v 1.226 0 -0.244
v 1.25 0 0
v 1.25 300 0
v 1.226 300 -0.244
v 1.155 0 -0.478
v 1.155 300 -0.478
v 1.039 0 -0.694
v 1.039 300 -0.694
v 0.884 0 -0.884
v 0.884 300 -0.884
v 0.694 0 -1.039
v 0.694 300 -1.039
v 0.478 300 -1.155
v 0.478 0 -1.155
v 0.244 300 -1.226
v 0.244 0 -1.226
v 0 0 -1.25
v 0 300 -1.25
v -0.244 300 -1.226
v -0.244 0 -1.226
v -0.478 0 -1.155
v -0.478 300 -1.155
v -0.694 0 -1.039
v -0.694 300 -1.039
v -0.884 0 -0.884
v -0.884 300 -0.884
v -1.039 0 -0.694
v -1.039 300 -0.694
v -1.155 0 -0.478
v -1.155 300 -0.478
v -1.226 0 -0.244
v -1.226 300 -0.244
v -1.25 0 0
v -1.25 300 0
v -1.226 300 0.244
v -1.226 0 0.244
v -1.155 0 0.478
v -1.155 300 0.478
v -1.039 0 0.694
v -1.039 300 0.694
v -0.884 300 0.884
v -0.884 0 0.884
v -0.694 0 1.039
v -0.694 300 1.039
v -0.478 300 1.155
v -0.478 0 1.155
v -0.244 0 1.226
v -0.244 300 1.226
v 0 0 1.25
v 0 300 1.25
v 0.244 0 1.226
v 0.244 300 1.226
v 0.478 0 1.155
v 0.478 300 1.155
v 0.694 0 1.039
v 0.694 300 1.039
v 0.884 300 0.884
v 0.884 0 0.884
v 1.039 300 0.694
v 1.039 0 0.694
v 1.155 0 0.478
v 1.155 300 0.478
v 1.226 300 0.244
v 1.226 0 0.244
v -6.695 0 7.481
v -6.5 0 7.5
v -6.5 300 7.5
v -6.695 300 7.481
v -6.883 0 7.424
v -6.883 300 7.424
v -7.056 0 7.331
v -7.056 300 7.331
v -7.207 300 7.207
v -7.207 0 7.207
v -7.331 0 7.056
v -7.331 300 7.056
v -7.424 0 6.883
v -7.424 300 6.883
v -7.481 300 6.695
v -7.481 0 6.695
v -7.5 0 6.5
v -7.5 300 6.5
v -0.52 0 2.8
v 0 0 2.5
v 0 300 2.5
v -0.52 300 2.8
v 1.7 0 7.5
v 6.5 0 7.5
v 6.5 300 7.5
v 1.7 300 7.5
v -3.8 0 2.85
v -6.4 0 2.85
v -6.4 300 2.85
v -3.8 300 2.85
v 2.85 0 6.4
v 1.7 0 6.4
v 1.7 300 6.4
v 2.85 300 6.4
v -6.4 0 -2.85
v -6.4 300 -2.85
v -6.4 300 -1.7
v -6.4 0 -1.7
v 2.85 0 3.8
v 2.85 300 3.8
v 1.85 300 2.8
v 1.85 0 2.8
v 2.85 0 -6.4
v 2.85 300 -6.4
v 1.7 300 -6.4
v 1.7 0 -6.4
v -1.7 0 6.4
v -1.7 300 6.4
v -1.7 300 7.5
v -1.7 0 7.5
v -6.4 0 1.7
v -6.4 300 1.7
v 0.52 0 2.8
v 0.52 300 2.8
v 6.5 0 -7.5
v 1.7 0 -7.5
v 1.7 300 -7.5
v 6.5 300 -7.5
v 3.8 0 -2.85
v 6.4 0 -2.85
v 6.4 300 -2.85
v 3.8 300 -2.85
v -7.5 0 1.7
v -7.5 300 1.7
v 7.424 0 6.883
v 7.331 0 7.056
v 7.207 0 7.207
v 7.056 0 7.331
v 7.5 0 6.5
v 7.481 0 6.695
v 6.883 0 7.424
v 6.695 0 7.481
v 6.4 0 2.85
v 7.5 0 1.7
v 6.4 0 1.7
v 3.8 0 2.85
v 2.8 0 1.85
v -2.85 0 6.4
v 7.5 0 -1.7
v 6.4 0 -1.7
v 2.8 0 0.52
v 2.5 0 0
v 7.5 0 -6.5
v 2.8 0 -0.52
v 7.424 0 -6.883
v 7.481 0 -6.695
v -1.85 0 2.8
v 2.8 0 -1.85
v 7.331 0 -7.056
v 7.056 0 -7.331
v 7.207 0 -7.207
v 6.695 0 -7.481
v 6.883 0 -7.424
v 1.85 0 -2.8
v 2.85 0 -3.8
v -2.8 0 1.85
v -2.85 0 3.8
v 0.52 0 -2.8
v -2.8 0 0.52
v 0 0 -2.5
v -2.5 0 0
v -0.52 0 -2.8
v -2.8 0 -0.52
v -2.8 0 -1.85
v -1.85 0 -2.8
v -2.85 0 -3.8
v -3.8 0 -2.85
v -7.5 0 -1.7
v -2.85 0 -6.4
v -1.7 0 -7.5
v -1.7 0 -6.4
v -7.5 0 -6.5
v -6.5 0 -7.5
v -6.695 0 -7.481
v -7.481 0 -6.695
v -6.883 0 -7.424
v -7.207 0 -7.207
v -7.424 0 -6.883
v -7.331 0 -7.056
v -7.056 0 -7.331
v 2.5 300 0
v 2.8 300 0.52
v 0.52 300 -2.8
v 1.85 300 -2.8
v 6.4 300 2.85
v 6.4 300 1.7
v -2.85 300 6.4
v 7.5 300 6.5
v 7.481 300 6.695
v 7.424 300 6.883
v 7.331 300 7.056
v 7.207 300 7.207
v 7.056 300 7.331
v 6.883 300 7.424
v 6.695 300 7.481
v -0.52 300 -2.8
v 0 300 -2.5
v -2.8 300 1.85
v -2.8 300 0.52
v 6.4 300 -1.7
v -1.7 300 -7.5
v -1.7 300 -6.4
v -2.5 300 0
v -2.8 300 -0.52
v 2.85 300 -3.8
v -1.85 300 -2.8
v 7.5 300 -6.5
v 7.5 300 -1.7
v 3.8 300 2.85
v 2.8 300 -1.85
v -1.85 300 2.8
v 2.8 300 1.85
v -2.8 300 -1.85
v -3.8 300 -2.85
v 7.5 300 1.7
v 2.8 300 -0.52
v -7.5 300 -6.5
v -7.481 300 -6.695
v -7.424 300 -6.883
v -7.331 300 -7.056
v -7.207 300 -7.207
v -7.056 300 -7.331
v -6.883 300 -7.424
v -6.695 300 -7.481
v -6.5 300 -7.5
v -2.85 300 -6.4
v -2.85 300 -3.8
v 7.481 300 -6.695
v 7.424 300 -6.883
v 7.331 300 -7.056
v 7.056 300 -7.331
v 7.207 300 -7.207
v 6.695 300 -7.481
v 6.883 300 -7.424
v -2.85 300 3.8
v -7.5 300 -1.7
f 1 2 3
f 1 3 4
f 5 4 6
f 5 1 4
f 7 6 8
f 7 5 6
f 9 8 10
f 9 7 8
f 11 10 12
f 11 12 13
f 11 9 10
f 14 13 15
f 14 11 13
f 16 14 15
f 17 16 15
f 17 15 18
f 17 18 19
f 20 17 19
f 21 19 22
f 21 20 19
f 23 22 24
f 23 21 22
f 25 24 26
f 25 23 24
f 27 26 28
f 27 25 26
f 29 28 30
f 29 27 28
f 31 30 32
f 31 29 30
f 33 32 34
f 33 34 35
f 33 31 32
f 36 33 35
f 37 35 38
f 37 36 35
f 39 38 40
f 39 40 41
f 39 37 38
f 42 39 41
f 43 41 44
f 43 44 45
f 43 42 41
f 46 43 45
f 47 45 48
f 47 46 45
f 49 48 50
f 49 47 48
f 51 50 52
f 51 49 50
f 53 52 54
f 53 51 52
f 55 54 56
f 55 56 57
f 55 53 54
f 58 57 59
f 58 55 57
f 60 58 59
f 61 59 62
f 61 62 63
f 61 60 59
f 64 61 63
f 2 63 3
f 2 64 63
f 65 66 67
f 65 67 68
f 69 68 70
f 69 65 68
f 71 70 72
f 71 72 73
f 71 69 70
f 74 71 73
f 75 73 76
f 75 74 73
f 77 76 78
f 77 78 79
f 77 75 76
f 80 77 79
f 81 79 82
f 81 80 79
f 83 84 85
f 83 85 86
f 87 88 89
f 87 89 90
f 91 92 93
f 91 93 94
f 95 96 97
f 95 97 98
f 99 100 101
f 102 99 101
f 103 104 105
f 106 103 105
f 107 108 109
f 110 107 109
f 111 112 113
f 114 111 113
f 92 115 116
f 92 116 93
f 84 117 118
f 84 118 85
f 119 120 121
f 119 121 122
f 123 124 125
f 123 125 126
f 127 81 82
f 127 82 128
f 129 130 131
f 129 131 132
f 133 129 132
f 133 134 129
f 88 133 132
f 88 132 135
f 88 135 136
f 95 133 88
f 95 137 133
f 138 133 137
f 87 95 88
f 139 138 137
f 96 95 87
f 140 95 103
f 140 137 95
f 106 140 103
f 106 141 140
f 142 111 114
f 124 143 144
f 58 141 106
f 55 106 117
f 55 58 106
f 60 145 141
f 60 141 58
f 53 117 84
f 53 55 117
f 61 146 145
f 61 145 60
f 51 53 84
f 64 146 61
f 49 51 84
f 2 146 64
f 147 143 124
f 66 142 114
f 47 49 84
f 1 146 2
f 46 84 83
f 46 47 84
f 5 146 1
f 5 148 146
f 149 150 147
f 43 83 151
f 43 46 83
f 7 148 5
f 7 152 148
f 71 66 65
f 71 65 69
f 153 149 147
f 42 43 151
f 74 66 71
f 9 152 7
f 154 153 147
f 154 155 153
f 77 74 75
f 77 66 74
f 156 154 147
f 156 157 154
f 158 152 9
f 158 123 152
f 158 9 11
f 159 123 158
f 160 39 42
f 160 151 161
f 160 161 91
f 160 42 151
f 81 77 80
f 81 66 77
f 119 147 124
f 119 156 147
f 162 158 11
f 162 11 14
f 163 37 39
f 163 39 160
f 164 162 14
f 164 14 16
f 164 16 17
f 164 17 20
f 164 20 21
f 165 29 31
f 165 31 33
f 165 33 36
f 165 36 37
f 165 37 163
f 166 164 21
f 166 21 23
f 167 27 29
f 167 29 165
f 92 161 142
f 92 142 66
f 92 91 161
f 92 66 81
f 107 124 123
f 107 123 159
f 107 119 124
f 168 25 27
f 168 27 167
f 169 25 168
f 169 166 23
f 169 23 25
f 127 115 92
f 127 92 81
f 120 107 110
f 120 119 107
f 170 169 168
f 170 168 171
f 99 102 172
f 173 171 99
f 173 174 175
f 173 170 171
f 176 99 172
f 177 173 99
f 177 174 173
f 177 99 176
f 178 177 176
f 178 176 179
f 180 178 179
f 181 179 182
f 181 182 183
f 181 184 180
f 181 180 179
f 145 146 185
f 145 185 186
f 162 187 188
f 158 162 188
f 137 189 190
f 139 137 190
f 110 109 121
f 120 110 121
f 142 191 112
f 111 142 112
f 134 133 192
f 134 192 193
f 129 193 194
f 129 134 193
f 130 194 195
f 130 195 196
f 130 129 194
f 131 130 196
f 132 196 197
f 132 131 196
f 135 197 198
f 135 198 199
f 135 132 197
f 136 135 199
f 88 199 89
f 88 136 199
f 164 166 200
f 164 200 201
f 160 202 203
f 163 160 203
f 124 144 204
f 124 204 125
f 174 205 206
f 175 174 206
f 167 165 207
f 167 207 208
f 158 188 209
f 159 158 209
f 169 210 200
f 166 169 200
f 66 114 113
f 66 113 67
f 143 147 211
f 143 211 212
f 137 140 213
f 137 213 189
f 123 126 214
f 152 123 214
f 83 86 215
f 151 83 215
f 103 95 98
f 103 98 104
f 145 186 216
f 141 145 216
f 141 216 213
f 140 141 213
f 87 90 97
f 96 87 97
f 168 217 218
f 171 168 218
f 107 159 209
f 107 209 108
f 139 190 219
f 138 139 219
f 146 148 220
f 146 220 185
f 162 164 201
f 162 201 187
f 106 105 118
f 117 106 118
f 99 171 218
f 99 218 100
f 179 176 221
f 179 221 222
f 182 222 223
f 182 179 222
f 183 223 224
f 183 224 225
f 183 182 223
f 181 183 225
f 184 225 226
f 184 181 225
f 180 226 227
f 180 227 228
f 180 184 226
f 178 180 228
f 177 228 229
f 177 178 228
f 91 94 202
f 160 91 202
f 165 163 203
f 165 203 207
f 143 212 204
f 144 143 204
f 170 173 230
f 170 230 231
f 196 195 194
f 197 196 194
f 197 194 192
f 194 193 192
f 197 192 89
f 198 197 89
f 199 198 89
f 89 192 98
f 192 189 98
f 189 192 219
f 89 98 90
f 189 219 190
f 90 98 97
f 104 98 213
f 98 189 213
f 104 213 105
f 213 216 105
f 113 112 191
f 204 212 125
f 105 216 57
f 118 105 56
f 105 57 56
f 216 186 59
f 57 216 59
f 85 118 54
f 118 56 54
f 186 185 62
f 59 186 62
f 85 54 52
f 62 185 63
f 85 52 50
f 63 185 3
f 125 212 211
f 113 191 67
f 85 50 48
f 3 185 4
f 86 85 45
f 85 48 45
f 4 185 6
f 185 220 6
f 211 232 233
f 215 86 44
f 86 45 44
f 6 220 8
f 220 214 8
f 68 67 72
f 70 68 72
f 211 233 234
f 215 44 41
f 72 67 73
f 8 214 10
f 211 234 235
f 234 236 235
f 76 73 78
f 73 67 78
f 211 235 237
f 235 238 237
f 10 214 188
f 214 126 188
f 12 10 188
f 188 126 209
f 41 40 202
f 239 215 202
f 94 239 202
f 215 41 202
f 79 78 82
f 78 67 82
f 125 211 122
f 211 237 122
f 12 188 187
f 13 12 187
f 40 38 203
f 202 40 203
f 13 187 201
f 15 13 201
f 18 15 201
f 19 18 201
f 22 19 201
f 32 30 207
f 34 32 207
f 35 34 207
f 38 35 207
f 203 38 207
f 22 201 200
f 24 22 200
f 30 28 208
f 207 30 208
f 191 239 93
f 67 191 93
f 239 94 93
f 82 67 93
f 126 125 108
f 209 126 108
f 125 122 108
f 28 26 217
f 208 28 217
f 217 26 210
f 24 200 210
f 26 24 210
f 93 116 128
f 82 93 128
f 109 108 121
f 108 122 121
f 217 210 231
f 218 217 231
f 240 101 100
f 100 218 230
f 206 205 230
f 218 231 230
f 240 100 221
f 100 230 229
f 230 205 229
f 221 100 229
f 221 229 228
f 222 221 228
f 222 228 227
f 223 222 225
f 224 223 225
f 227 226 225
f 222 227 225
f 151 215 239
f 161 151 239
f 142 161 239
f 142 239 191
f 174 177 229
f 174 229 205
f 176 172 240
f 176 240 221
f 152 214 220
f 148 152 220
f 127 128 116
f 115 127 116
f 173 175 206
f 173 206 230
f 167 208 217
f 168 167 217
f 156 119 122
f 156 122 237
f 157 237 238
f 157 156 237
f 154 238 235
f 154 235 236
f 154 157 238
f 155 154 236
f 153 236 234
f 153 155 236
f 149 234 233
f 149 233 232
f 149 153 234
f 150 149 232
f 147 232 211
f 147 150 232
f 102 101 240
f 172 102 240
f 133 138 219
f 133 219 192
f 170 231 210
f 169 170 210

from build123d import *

# Parameters (mm, degrees)
SKETCH1_R           = 1.25
BOSS_EXTRUDE1_DEPTH = 300


with BuildPart() as part:
    # Sketch1 → Boss-Extrude1 (new body)
    with BuildSketch(Plane(origin=(0, 0, 0), x_dir=(1, 0, 0), z_dir=(0, 1, 0))):
        with BuildLine():
            Line((6.5, -7.5), (1.7, -7.5))
            Line((1.7, -7.5), (1.7, -6.4))
            Line((1.7, -6.4), (2.85, -6.4))
            Line((2.85, -6.4), (2.85, -3.8))
            Line((2.85, -3.8), (1.85, -2.8))
            Line((1.85, -2.8), (0.519615242, -2.8))
            Line((0.519615242, -2.8), (0, -2.5))
            Line((0, -2.5), (-0.519615242, -2.8))
            Line((-0.519615242, -2.8), (-1.85, -2.8))
            Line((-1.85, -2.8), (-2.85, -3.8))
            Line((-2.85, -3.8), (-2.85, -6.4))
            Line((-2.85, -6.4), (-1.7, -6.4))
            Line((-1.7, -6.4), (-1.7, -7.5))
            Line((-1.7, -7.5), (-6.5, -7.5))
            ThreePointArc((-6.5, -7.5), (-7.207106781, -7.207106781), (-7.5, -6.5))
            Line((-7.5, -6.5), (-7.5, -1.7))
            Line((-7.5, -1.7), (-6.4, -1.7))
            Line((-6.4, -1.7), (-6.4, -2.85))
            Line((-6.4, -2.85), (-3.8, -2.85))
            Line((-3.8, -2.85), (-2.8, -1.85))
            Line((-2.8, -1.85), (-2.8, -0.519615242))
            Line((-2.8, -0.519615242), (-2.5, 0))
            Line((-2.5, 0), (-2.8, 0.519615242))
            Line((-2.8, 0.519615242), (-2.8, 1.85))
            Line((-2.8, 1.85), (-3.8, 2.85))
            Line((-3.8, 2.85), (-6.4, 2.85))
            Line((-6.4, 2.85), (-6.4, 1.7))
            Line((-6.4, 1.7), (-7.5, 1.7))
            Line((-7.5, 1.7), (-7.5, 6.5))
            ThreePointArc((-7.5, 6.5), (-7.207106781, 7.207106781), (-6.5, 7.5))
            Line((-6.5, 7.5), (-1.7, 7.5))
            Line((-1.7, 7.5), (-1.7, 6.4))
            Line((-1.7, 6.4), (-2.85, 6.4))
            Line((-2.85, 6.4), (-2.85, 3.8))
            Line((-2.85, 3.8), (-1.85, 2.8))
            Line((-1.85, 2.8), (-0.519615242, 2.8))
            Line((-0.519615242, 2.8), (0, 2.5))
            Line((0, 2.5), (0.519615242, 2.8))
            Line((0.519615242, 2.8), (1.85, 2.8))
            Line((1.85, 2.8), (2.85, 3.8))
            Line((2.85, 3.8), (2.85, 6.4))
            Line((2.85, 6.4), (1.7, 6.4))
            Line((1.7, 6.4), (1.7, 7.5))
            Line((1.7, 7.5), (6.5, 7.5))
            ThreePointArc((6.5, 7.5), (7.207106781, 7.207106781), (7.5, 6.5))
            Line((7.5, 6.5), (7.5, 1.7))
            Line((7.5, 1.7), (6.4, 1.7))
            Line((6.4, 1.7), (6.4, 2.85))
            Line((6.4, 2.85), (3.8, 2.85))
            Line((3.8, 2.85), (2.8, 1.85))
            Line((2.8, 1.85), (2.8, 0.519615242))
            Line((2.8, 0.519615242), (2.5, 0))
            Line((2.5, 0), (2.8, -0.519615242))
            Line((2.8, -0.519615242), (2.8, -1.85))
            Line((2.8, -1.85), (3.8, -2.85))
            Line((3.8, -2.85), (6.4, -2.85))
            Line((6.4, -2.85), (6.4, -1.7))
            Line((6.4, -1.7), (7.5, -1.7))
            Line((7.5, -1.7), (7.5, -6.5))
            ThreePointArc((7.5, -6.5), (7.207106781, -7.207106781), (6.5, -7.5))
        make_face()
        Circle(SKETCH1_R, mode=Mode.SUBTRACT)
    extrude(amount=BOSS_EXTRUDE1_DEPTH)


solid = part.part
